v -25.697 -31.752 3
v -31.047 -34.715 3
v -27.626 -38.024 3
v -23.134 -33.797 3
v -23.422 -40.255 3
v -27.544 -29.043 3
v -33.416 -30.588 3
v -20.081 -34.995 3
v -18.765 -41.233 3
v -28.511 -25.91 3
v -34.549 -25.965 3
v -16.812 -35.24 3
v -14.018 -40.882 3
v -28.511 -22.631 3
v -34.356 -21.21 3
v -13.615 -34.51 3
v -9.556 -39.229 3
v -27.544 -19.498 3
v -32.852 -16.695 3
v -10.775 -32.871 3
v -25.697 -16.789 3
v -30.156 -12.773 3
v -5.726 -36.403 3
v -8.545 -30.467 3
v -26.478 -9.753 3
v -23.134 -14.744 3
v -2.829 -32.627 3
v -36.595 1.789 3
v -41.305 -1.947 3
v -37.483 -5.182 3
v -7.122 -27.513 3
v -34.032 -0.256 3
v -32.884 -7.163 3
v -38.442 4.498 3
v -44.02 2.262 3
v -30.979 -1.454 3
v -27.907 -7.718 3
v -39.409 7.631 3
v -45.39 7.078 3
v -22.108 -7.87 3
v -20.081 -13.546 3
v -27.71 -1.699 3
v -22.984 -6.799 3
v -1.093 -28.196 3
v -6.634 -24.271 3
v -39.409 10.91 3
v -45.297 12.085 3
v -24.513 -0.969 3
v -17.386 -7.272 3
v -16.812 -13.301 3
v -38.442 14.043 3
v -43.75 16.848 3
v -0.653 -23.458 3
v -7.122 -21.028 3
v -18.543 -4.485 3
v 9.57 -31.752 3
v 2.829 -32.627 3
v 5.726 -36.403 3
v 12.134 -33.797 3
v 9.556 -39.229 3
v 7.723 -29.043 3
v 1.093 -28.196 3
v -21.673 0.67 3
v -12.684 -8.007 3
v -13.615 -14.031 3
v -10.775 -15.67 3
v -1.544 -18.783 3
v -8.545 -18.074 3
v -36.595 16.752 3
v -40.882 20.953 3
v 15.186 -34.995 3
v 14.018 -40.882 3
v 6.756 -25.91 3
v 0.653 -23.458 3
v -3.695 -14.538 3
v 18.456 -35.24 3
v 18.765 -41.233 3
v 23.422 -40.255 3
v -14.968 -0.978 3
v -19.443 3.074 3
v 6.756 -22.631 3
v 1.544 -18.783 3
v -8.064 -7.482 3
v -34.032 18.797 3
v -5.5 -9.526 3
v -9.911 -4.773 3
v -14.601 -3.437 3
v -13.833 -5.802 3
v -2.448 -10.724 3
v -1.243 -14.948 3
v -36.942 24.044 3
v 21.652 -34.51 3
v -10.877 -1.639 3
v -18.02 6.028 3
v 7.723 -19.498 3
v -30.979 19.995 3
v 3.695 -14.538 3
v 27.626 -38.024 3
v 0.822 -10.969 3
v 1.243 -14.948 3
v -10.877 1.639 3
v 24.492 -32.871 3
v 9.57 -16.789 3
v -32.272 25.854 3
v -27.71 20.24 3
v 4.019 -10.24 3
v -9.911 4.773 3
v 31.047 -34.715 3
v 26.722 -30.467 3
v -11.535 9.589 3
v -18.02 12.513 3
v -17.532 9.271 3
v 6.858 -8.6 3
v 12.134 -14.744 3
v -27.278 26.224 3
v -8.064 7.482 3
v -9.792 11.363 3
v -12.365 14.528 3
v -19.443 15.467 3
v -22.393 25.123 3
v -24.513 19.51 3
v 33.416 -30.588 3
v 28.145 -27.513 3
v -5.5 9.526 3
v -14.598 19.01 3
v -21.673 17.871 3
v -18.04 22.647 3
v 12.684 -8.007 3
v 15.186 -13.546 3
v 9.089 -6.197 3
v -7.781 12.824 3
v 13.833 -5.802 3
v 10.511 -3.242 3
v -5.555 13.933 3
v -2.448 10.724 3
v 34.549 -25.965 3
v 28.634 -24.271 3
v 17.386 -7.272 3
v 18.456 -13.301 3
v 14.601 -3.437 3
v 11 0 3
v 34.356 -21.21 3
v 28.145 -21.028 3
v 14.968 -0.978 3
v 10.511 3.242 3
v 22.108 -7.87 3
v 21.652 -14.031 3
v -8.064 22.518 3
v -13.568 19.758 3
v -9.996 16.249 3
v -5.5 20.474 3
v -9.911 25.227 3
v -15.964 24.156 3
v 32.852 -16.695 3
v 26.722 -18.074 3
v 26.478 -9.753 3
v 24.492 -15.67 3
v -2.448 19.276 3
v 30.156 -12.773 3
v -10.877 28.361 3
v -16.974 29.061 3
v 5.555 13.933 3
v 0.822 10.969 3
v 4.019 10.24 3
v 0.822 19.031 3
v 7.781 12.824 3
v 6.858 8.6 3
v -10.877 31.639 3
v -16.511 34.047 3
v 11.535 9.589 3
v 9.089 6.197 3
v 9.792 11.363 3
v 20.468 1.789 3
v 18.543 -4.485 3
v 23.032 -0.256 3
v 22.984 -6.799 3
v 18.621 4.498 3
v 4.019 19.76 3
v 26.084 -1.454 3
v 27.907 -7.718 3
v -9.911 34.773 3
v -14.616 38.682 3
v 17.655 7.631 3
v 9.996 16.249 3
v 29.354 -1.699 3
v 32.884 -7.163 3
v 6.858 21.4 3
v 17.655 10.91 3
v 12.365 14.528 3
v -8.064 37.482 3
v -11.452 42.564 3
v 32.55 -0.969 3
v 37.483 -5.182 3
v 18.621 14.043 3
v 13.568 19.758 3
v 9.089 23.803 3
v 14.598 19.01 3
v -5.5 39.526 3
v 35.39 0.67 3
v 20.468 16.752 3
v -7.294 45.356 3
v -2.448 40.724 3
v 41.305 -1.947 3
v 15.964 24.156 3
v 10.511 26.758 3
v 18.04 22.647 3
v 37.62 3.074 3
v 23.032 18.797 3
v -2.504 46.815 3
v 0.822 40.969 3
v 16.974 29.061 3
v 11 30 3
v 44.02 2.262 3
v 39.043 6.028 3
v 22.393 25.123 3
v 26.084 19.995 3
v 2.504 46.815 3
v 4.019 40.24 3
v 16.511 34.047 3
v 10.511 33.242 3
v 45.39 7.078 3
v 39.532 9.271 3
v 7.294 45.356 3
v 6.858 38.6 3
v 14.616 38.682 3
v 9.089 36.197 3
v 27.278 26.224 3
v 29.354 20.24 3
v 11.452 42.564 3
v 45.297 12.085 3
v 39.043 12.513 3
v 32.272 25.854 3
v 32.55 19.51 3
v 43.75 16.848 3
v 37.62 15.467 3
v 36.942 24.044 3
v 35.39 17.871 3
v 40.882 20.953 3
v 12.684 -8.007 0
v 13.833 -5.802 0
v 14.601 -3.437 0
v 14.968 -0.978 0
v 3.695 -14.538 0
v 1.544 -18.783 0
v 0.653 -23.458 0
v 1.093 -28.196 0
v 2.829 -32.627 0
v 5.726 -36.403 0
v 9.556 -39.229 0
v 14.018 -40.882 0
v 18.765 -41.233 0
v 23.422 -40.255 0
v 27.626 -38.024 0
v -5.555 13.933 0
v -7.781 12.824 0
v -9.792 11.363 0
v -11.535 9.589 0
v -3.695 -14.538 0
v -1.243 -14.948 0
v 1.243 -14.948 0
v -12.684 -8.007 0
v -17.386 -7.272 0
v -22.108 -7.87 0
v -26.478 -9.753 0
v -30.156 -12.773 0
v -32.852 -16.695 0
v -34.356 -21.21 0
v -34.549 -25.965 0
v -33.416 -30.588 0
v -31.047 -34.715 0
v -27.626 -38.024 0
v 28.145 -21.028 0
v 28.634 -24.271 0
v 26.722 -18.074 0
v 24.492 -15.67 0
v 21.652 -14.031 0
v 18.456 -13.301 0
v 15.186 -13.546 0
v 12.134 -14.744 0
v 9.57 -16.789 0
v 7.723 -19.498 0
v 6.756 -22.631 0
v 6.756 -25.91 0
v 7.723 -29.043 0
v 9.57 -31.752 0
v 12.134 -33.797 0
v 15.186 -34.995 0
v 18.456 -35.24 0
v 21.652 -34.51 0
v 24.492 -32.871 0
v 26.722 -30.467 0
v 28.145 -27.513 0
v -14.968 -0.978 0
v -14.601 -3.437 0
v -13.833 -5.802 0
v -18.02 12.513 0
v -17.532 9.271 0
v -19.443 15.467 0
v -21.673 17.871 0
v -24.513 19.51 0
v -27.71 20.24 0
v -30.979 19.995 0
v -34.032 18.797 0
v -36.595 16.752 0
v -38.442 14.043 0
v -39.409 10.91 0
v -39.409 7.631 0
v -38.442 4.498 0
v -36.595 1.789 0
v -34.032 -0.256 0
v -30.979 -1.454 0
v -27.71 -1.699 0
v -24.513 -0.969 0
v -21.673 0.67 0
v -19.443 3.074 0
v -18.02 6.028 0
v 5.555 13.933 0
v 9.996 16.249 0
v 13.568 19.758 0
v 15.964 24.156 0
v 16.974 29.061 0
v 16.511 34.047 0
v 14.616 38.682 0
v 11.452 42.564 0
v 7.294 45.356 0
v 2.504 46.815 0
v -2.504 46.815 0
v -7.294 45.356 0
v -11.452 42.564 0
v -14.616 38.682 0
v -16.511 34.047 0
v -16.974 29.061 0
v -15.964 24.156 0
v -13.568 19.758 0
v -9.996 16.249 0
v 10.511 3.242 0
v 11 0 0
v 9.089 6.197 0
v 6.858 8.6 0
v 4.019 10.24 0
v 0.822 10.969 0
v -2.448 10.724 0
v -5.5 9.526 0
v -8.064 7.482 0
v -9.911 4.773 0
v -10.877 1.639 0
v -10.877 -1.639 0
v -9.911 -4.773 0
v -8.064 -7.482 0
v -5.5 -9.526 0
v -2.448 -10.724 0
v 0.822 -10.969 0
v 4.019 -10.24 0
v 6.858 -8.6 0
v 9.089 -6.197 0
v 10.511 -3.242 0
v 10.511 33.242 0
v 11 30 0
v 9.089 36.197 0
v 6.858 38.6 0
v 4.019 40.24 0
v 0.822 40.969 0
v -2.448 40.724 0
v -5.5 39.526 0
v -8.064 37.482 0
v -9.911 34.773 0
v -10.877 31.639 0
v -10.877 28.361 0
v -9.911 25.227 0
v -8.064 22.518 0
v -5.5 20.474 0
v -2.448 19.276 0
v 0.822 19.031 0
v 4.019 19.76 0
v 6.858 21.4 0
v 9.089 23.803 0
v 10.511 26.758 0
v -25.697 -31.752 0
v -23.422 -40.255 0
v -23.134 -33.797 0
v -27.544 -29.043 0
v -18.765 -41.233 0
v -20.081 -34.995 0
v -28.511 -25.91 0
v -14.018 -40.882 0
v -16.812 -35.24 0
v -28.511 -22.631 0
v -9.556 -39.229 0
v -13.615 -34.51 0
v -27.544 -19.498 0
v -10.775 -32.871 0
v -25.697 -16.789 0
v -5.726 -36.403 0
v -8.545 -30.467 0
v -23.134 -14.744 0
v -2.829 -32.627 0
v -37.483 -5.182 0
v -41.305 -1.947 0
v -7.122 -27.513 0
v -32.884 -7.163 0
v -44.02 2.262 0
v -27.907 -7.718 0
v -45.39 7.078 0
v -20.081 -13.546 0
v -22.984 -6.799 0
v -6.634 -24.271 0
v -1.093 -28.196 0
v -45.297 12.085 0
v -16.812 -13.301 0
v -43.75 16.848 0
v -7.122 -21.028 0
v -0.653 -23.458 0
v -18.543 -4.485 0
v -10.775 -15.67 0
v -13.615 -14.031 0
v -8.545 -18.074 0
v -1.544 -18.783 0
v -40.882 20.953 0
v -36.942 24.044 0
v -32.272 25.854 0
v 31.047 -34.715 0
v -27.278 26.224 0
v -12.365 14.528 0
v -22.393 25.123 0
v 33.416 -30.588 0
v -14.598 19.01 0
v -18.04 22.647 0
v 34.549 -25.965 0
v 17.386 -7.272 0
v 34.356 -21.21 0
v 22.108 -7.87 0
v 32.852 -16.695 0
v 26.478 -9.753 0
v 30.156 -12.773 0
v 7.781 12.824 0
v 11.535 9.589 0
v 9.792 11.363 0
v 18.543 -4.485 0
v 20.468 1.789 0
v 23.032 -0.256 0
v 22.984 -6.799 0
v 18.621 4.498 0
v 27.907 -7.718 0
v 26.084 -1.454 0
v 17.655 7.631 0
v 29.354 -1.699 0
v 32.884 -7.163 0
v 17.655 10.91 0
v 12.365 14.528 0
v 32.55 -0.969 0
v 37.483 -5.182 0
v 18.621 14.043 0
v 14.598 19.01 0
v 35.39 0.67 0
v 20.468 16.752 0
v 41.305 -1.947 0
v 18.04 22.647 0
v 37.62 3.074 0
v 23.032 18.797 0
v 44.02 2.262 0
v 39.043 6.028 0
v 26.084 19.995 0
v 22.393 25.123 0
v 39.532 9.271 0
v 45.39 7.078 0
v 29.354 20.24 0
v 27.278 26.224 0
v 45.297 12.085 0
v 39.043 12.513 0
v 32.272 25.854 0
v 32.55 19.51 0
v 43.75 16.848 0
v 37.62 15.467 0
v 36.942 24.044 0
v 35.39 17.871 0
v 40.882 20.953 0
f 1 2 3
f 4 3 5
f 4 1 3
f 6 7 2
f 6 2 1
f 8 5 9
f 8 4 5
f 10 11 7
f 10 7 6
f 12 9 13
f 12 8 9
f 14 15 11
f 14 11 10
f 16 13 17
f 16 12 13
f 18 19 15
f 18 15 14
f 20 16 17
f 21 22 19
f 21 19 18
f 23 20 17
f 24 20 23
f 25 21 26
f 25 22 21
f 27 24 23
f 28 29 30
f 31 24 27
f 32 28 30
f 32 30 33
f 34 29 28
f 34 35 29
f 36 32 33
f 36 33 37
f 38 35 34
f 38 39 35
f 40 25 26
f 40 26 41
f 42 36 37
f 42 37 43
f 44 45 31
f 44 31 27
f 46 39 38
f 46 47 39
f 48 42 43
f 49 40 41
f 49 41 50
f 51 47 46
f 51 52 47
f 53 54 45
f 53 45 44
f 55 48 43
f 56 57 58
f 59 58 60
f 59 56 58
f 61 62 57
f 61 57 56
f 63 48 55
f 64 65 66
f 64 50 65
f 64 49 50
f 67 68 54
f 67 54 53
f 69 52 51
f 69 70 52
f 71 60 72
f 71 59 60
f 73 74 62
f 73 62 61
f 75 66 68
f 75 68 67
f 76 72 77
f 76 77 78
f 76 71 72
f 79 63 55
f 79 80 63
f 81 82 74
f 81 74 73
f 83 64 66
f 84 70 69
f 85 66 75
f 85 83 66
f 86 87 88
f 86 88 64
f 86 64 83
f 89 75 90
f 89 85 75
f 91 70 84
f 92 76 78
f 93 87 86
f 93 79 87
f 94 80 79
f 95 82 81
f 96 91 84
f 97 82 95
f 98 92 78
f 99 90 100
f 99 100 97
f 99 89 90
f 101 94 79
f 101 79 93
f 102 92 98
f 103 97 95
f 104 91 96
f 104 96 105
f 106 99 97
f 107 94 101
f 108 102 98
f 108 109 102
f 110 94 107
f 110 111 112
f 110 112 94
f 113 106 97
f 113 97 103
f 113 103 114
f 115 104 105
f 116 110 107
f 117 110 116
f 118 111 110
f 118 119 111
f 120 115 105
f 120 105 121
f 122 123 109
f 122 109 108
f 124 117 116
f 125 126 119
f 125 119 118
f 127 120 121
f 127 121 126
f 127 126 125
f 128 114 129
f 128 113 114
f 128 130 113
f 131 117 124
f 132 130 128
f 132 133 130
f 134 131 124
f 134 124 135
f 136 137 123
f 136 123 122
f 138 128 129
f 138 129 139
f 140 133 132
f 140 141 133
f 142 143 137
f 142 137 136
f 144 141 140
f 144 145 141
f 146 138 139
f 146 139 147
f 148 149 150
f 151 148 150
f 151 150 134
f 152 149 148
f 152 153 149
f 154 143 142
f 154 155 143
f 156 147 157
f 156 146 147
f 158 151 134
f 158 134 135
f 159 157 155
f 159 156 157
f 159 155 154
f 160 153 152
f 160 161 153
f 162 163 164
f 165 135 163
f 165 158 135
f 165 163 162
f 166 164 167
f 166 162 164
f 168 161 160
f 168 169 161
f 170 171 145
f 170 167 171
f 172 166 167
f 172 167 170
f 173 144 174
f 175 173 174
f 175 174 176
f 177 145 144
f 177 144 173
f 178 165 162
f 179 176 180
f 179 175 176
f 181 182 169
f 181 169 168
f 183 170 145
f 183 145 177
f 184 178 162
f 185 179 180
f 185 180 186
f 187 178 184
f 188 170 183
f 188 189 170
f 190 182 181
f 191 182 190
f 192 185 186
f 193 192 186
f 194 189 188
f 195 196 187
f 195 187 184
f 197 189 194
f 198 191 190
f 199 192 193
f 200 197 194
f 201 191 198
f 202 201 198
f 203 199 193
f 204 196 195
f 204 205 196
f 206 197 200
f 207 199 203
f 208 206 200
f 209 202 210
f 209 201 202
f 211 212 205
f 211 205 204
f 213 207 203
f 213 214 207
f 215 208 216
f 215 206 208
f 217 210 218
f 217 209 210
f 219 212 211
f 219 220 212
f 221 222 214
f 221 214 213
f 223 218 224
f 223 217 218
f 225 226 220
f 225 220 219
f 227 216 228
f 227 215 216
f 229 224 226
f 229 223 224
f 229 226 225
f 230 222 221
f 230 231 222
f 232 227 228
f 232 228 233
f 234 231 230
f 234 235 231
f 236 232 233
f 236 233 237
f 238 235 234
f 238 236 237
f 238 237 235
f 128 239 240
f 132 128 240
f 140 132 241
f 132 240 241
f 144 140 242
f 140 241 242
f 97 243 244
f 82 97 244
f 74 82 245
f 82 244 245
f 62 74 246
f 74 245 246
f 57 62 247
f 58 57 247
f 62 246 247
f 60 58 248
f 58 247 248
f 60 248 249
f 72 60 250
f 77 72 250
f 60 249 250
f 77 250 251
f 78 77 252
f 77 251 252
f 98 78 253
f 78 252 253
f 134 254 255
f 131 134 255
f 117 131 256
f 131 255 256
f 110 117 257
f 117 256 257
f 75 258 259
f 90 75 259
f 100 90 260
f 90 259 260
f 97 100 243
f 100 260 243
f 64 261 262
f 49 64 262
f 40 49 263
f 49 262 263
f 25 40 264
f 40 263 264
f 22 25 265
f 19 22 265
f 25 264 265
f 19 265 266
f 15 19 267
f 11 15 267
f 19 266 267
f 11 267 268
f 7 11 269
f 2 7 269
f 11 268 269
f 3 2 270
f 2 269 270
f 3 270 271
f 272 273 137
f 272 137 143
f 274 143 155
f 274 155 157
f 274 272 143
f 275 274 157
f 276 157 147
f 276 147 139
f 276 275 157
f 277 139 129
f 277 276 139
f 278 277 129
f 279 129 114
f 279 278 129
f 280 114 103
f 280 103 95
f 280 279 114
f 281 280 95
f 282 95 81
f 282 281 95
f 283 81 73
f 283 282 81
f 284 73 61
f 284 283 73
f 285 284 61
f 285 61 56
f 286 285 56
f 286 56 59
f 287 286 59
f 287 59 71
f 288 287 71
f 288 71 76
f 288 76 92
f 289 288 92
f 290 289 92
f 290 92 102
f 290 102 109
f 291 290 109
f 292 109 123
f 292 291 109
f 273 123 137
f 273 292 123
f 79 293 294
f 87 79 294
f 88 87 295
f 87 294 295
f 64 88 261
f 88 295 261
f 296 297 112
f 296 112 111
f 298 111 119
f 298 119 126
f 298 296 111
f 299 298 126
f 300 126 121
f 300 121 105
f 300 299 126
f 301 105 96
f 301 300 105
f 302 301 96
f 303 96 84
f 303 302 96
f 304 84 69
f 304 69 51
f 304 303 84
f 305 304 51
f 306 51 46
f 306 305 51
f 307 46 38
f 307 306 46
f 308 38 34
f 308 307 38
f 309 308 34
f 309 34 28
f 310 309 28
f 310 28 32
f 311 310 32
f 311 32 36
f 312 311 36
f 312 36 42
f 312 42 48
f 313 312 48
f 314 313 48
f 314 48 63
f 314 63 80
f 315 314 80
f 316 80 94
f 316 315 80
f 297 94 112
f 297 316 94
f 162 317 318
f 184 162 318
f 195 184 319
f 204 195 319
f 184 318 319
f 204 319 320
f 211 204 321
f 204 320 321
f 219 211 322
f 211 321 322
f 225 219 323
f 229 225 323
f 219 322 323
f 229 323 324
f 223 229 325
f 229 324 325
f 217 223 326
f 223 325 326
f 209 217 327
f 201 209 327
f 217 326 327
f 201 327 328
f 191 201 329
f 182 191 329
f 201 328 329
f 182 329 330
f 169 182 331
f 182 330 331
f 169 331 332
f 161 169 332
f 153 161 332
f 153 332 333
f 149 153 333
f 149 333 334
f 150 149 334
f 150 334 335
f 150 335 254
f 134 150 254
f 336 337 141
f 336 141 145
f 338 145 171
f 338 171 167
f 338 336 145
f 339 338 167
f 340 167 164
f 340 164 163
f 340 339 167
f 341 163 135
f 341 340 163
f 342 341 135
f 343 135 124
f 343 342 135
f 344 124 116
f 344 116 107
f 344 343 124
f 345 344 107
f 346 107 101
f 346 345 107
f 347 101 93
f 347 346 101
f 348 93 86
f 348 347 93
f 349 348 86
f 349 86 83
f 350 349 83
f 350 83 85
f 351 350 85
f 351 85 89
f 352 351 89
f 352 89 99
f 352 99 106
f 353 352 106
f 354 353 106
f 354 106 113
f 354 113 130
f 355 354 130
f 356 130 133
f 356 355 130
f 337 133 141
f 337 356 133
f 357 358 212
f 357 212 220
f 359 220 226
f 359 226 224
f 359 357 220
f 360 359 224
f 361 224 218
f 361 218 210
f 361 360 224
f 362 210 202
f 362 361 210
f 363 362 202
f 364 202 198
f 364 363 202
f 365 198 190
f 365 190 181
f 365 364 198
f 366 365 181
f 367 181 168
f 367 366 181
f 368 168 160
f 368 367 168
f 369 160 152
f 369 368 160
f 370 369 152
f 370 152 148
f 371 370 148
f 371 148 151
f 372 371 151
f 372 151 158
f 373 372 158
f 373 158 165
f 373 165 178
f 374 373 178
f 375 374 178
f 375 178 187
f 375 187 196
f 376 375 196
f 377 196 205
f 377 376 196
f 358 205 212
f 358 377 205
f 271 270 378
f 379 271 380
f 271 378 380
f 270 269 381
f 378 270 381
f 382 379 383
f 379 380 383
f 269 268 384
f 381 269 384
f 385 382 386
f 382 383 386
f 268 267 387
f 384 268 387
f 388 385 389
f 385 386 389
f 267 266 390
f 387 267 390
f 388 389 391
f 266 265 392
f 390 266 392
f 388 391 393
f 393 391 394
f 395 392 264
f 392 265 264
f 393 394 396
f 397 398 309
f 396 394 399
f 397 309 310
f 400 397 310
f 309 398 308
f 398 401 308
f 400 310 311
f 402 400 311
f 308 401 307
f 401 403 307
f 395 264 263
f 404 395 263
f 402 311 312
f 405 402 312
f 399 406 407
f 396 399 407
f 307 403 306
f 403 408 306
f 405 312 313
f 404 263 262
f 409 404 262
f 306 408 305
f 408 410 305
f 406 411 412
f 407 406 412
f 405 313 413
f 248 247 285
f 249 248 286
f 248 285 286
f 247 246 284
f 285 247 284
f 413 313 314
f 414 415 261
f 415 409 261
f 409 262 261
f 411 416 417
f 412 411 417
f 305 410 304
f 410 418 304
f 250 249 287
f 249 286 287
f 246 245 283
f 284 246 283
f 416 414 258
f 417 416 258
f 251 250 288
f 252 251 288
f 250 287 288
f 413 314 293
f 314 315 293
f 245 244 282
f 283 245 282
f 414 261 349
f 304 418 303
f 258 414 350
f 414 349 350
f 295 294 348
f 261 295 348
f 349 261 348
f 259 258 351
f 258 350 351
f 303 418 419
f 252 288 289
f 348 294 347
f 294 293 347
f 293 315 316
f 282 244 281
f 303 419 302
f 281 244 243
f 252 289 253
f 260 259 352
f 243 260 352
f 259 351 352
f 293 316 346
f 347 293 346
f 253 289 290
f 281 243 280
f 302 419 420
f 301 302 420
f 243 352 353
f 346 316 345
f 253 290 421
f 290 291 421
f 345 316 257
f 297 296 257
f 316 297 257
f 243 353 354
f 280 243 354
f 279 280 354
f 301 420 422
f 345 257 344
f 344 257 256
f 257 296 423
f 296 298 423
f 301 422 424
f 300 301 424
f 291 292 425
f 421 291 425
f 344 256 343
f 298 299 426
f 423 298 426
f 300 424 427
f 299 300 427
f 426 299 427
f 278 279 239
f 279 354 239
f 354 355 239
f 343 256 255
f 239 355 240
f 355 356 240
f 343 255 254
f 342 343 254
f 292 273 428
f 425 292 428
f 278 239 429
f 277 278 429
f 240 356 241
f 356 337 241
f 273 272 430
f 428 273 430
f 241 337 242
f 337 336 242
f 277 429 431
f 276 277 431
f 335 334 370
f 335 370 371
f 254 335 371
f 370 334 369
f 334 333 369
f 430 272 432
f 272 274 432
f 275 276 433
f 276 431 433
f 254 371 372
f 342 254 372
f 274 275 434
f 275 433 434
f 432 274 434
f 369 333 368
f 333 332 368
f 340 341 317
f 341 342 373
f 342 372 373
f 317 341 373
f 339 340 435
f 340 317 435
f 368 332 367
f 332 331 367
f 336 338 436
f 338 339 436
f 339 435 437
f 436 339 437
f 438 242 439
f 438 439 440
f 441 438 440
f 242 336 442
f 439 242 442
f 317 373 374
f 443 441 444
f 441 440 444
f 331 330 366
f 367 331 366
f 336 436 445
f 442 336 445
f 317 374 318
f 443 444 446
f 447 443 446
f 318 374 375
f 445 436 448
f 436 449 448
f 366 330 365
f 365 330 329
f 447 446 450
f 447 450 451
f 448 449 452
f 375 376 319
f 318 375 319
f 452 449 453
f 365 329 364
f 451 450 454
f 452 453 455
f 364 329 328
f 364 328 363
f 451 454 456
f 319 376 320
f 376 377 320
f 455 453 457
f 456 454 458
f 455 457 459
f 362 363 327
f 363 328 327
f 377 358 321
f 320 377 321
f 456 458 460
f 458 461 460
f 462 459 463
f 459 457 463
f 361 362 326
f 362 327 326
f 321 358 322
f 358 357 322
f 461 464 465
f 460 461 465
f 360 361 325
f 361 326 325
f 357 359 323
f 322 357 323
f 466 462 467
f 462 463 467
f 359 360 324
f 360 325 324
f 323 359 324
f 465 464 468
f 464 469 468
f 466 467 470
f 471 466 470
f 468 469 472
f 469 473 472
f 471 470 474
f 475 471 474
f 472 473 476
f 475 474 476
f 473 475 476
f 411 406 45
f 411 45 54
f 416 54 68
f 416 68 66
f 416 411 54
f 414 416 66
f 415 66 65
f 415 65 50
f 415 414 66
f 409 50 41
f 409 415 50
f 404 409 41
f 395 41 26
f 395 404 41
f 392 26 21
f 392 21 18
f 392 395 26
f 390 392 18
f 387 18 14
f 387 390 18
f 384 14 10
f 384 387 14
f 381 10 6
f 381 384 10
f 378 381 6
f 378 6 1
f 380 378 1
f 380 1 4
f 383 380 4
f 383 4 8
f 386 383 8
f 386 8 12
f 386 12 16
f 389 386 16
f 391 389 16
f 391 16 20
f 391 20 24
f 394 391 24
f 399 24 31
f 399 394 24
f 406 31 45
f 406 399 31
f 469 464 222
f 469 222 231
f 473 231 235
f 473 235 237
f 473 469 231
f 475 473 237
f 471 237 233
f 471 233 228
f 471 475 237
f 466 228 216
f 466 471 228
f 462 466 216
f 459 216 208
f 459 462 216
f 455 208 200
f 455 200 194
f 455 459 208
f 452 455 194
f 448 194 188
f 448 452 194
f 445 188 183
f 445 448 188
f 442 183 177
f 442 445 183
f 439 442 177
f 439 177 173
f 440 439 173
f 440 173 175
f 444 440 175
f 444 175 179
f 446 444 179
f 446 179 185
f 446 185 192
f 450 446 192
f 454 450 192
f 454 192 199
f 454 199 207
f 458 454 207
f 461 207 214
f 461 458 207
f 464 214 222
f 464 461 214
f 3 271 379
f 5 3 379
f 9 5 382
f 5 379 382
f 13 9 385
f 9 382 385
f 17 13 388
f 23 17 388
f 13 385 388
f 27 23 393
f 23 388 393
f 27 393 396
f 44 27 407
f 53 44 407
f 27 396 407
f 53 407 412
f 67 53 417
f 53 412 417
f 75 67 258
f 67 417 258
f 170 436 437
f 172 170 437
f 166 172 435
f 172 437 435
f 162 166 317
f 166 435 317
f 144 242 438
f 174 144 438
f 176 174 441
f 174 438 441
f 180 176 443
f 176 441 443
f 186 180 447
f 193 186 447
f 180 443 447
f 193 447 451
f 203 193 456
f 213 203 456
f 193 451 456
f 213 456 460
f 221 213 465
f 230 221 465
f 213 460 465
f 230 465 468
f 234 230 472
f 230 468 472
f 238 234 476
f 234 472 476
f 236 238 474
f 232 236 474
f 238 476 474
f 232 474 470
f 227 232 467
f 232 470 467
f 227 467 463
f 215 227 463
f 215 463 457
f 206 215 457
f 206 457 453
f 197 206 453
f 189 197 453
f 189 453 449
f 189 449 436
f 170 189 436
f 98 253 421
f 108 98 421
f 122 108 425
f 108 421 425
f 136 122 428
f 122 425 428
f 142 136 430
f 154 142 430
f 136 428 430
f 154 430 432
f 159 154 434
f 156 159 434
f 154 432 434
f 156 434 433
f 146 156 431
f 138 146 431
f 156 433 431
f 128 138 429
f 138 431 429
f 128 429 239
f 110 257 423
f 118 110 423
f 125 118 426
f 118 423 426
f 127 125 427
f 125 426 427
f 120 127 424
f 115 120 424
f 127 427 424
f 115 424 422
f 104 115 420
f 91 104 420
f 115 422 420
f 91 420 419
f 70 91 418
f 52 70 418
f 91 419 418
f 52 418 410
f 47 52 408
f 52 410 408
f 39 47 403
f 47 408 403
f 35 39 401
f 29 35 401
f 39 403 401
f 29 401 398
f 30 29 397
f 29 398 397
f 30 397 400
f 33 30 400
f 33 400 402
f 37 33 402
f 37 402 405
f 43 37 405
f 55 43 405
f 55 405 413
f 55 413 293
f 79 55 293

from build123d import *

# Parameters (mm, degrees)
F0_R     = 11
F1_DEPTH = 3


with BuildPart() as f1:
    # F0 (on Top) → F1 (new body)
    with BuildSketch(Plane.XY):
        with BuildLine():
            ThreePointArc((-27.625907, -38.023799), (-5.725919, -36.403446), (-3.695413, -14.537673))
            ThreePointArc((-3.695413, -14.537673), (0, -15), (3.695413, -14.537673))
            ThreePointArc((3.695413, -14.537673), (5.725919, -36.403446), (27.625907, -38.023799))
            ThreePointArc((27.625907, -38.023799), (32.852328, -16.694956), (12.684203, -8.006934))
            ThreePointArc((12.684203, -8.006934), (14.265848, -4.635255), (14.968094, -0.977841))
            ThreePointArc((14.968094, -0.977841), (44.699656, 14.523799), (11.534681, 9.589115))
            ThreePointArc((11.534681, 9.589115), (8.816779, 12.135255), (5.555378, 13.933333))
            ThreePointArc((5.555378, 13.933333), (0, 47), (-5.555378, 13.933333))
            ThreePointArc((-5.555378, 13.933333), (-8.816779, 12.135255), (-11.534681, 9.589115))
            ThreePointArc((-11.534681, 9.589115), (-44.699656, 14.523799), (-14.968094, -0.977841))
            ThreePointArc((-14.968094, -0.977841), (-14.265848, -4.635255), (-12.684203, -8.006934))
            ThreePointArc((-12.684203, -8.006934), (-32.852328, -16.694956), (-27.625907, -38.023799))
        make_face()
        with Locations((-17.633558, -24.27051)):
            Circle(F0_R, mode=Mode.SUBTRACT)
        Circle(F0_R, mode=Mode.SUBTRACT)
        with Locations((17.633558, -24.27051)):
            Circle(F0_R, mode=Mode.SUBTRACT)
        with Locations((-28.531695, 9.27051)):
            Circle(F0_R, mode=Mode.SUBTRACT)
        with Locations((0, 30)):
            Circle(F0_R, mode=Mode.SUBTRACT)
        with Locations((28.531695, 9.27051)):
            Circle(F0_R, mode=Mode.SUBTRACT)
    extrude(amount=F1_DEPTH)


solid = f1.part
